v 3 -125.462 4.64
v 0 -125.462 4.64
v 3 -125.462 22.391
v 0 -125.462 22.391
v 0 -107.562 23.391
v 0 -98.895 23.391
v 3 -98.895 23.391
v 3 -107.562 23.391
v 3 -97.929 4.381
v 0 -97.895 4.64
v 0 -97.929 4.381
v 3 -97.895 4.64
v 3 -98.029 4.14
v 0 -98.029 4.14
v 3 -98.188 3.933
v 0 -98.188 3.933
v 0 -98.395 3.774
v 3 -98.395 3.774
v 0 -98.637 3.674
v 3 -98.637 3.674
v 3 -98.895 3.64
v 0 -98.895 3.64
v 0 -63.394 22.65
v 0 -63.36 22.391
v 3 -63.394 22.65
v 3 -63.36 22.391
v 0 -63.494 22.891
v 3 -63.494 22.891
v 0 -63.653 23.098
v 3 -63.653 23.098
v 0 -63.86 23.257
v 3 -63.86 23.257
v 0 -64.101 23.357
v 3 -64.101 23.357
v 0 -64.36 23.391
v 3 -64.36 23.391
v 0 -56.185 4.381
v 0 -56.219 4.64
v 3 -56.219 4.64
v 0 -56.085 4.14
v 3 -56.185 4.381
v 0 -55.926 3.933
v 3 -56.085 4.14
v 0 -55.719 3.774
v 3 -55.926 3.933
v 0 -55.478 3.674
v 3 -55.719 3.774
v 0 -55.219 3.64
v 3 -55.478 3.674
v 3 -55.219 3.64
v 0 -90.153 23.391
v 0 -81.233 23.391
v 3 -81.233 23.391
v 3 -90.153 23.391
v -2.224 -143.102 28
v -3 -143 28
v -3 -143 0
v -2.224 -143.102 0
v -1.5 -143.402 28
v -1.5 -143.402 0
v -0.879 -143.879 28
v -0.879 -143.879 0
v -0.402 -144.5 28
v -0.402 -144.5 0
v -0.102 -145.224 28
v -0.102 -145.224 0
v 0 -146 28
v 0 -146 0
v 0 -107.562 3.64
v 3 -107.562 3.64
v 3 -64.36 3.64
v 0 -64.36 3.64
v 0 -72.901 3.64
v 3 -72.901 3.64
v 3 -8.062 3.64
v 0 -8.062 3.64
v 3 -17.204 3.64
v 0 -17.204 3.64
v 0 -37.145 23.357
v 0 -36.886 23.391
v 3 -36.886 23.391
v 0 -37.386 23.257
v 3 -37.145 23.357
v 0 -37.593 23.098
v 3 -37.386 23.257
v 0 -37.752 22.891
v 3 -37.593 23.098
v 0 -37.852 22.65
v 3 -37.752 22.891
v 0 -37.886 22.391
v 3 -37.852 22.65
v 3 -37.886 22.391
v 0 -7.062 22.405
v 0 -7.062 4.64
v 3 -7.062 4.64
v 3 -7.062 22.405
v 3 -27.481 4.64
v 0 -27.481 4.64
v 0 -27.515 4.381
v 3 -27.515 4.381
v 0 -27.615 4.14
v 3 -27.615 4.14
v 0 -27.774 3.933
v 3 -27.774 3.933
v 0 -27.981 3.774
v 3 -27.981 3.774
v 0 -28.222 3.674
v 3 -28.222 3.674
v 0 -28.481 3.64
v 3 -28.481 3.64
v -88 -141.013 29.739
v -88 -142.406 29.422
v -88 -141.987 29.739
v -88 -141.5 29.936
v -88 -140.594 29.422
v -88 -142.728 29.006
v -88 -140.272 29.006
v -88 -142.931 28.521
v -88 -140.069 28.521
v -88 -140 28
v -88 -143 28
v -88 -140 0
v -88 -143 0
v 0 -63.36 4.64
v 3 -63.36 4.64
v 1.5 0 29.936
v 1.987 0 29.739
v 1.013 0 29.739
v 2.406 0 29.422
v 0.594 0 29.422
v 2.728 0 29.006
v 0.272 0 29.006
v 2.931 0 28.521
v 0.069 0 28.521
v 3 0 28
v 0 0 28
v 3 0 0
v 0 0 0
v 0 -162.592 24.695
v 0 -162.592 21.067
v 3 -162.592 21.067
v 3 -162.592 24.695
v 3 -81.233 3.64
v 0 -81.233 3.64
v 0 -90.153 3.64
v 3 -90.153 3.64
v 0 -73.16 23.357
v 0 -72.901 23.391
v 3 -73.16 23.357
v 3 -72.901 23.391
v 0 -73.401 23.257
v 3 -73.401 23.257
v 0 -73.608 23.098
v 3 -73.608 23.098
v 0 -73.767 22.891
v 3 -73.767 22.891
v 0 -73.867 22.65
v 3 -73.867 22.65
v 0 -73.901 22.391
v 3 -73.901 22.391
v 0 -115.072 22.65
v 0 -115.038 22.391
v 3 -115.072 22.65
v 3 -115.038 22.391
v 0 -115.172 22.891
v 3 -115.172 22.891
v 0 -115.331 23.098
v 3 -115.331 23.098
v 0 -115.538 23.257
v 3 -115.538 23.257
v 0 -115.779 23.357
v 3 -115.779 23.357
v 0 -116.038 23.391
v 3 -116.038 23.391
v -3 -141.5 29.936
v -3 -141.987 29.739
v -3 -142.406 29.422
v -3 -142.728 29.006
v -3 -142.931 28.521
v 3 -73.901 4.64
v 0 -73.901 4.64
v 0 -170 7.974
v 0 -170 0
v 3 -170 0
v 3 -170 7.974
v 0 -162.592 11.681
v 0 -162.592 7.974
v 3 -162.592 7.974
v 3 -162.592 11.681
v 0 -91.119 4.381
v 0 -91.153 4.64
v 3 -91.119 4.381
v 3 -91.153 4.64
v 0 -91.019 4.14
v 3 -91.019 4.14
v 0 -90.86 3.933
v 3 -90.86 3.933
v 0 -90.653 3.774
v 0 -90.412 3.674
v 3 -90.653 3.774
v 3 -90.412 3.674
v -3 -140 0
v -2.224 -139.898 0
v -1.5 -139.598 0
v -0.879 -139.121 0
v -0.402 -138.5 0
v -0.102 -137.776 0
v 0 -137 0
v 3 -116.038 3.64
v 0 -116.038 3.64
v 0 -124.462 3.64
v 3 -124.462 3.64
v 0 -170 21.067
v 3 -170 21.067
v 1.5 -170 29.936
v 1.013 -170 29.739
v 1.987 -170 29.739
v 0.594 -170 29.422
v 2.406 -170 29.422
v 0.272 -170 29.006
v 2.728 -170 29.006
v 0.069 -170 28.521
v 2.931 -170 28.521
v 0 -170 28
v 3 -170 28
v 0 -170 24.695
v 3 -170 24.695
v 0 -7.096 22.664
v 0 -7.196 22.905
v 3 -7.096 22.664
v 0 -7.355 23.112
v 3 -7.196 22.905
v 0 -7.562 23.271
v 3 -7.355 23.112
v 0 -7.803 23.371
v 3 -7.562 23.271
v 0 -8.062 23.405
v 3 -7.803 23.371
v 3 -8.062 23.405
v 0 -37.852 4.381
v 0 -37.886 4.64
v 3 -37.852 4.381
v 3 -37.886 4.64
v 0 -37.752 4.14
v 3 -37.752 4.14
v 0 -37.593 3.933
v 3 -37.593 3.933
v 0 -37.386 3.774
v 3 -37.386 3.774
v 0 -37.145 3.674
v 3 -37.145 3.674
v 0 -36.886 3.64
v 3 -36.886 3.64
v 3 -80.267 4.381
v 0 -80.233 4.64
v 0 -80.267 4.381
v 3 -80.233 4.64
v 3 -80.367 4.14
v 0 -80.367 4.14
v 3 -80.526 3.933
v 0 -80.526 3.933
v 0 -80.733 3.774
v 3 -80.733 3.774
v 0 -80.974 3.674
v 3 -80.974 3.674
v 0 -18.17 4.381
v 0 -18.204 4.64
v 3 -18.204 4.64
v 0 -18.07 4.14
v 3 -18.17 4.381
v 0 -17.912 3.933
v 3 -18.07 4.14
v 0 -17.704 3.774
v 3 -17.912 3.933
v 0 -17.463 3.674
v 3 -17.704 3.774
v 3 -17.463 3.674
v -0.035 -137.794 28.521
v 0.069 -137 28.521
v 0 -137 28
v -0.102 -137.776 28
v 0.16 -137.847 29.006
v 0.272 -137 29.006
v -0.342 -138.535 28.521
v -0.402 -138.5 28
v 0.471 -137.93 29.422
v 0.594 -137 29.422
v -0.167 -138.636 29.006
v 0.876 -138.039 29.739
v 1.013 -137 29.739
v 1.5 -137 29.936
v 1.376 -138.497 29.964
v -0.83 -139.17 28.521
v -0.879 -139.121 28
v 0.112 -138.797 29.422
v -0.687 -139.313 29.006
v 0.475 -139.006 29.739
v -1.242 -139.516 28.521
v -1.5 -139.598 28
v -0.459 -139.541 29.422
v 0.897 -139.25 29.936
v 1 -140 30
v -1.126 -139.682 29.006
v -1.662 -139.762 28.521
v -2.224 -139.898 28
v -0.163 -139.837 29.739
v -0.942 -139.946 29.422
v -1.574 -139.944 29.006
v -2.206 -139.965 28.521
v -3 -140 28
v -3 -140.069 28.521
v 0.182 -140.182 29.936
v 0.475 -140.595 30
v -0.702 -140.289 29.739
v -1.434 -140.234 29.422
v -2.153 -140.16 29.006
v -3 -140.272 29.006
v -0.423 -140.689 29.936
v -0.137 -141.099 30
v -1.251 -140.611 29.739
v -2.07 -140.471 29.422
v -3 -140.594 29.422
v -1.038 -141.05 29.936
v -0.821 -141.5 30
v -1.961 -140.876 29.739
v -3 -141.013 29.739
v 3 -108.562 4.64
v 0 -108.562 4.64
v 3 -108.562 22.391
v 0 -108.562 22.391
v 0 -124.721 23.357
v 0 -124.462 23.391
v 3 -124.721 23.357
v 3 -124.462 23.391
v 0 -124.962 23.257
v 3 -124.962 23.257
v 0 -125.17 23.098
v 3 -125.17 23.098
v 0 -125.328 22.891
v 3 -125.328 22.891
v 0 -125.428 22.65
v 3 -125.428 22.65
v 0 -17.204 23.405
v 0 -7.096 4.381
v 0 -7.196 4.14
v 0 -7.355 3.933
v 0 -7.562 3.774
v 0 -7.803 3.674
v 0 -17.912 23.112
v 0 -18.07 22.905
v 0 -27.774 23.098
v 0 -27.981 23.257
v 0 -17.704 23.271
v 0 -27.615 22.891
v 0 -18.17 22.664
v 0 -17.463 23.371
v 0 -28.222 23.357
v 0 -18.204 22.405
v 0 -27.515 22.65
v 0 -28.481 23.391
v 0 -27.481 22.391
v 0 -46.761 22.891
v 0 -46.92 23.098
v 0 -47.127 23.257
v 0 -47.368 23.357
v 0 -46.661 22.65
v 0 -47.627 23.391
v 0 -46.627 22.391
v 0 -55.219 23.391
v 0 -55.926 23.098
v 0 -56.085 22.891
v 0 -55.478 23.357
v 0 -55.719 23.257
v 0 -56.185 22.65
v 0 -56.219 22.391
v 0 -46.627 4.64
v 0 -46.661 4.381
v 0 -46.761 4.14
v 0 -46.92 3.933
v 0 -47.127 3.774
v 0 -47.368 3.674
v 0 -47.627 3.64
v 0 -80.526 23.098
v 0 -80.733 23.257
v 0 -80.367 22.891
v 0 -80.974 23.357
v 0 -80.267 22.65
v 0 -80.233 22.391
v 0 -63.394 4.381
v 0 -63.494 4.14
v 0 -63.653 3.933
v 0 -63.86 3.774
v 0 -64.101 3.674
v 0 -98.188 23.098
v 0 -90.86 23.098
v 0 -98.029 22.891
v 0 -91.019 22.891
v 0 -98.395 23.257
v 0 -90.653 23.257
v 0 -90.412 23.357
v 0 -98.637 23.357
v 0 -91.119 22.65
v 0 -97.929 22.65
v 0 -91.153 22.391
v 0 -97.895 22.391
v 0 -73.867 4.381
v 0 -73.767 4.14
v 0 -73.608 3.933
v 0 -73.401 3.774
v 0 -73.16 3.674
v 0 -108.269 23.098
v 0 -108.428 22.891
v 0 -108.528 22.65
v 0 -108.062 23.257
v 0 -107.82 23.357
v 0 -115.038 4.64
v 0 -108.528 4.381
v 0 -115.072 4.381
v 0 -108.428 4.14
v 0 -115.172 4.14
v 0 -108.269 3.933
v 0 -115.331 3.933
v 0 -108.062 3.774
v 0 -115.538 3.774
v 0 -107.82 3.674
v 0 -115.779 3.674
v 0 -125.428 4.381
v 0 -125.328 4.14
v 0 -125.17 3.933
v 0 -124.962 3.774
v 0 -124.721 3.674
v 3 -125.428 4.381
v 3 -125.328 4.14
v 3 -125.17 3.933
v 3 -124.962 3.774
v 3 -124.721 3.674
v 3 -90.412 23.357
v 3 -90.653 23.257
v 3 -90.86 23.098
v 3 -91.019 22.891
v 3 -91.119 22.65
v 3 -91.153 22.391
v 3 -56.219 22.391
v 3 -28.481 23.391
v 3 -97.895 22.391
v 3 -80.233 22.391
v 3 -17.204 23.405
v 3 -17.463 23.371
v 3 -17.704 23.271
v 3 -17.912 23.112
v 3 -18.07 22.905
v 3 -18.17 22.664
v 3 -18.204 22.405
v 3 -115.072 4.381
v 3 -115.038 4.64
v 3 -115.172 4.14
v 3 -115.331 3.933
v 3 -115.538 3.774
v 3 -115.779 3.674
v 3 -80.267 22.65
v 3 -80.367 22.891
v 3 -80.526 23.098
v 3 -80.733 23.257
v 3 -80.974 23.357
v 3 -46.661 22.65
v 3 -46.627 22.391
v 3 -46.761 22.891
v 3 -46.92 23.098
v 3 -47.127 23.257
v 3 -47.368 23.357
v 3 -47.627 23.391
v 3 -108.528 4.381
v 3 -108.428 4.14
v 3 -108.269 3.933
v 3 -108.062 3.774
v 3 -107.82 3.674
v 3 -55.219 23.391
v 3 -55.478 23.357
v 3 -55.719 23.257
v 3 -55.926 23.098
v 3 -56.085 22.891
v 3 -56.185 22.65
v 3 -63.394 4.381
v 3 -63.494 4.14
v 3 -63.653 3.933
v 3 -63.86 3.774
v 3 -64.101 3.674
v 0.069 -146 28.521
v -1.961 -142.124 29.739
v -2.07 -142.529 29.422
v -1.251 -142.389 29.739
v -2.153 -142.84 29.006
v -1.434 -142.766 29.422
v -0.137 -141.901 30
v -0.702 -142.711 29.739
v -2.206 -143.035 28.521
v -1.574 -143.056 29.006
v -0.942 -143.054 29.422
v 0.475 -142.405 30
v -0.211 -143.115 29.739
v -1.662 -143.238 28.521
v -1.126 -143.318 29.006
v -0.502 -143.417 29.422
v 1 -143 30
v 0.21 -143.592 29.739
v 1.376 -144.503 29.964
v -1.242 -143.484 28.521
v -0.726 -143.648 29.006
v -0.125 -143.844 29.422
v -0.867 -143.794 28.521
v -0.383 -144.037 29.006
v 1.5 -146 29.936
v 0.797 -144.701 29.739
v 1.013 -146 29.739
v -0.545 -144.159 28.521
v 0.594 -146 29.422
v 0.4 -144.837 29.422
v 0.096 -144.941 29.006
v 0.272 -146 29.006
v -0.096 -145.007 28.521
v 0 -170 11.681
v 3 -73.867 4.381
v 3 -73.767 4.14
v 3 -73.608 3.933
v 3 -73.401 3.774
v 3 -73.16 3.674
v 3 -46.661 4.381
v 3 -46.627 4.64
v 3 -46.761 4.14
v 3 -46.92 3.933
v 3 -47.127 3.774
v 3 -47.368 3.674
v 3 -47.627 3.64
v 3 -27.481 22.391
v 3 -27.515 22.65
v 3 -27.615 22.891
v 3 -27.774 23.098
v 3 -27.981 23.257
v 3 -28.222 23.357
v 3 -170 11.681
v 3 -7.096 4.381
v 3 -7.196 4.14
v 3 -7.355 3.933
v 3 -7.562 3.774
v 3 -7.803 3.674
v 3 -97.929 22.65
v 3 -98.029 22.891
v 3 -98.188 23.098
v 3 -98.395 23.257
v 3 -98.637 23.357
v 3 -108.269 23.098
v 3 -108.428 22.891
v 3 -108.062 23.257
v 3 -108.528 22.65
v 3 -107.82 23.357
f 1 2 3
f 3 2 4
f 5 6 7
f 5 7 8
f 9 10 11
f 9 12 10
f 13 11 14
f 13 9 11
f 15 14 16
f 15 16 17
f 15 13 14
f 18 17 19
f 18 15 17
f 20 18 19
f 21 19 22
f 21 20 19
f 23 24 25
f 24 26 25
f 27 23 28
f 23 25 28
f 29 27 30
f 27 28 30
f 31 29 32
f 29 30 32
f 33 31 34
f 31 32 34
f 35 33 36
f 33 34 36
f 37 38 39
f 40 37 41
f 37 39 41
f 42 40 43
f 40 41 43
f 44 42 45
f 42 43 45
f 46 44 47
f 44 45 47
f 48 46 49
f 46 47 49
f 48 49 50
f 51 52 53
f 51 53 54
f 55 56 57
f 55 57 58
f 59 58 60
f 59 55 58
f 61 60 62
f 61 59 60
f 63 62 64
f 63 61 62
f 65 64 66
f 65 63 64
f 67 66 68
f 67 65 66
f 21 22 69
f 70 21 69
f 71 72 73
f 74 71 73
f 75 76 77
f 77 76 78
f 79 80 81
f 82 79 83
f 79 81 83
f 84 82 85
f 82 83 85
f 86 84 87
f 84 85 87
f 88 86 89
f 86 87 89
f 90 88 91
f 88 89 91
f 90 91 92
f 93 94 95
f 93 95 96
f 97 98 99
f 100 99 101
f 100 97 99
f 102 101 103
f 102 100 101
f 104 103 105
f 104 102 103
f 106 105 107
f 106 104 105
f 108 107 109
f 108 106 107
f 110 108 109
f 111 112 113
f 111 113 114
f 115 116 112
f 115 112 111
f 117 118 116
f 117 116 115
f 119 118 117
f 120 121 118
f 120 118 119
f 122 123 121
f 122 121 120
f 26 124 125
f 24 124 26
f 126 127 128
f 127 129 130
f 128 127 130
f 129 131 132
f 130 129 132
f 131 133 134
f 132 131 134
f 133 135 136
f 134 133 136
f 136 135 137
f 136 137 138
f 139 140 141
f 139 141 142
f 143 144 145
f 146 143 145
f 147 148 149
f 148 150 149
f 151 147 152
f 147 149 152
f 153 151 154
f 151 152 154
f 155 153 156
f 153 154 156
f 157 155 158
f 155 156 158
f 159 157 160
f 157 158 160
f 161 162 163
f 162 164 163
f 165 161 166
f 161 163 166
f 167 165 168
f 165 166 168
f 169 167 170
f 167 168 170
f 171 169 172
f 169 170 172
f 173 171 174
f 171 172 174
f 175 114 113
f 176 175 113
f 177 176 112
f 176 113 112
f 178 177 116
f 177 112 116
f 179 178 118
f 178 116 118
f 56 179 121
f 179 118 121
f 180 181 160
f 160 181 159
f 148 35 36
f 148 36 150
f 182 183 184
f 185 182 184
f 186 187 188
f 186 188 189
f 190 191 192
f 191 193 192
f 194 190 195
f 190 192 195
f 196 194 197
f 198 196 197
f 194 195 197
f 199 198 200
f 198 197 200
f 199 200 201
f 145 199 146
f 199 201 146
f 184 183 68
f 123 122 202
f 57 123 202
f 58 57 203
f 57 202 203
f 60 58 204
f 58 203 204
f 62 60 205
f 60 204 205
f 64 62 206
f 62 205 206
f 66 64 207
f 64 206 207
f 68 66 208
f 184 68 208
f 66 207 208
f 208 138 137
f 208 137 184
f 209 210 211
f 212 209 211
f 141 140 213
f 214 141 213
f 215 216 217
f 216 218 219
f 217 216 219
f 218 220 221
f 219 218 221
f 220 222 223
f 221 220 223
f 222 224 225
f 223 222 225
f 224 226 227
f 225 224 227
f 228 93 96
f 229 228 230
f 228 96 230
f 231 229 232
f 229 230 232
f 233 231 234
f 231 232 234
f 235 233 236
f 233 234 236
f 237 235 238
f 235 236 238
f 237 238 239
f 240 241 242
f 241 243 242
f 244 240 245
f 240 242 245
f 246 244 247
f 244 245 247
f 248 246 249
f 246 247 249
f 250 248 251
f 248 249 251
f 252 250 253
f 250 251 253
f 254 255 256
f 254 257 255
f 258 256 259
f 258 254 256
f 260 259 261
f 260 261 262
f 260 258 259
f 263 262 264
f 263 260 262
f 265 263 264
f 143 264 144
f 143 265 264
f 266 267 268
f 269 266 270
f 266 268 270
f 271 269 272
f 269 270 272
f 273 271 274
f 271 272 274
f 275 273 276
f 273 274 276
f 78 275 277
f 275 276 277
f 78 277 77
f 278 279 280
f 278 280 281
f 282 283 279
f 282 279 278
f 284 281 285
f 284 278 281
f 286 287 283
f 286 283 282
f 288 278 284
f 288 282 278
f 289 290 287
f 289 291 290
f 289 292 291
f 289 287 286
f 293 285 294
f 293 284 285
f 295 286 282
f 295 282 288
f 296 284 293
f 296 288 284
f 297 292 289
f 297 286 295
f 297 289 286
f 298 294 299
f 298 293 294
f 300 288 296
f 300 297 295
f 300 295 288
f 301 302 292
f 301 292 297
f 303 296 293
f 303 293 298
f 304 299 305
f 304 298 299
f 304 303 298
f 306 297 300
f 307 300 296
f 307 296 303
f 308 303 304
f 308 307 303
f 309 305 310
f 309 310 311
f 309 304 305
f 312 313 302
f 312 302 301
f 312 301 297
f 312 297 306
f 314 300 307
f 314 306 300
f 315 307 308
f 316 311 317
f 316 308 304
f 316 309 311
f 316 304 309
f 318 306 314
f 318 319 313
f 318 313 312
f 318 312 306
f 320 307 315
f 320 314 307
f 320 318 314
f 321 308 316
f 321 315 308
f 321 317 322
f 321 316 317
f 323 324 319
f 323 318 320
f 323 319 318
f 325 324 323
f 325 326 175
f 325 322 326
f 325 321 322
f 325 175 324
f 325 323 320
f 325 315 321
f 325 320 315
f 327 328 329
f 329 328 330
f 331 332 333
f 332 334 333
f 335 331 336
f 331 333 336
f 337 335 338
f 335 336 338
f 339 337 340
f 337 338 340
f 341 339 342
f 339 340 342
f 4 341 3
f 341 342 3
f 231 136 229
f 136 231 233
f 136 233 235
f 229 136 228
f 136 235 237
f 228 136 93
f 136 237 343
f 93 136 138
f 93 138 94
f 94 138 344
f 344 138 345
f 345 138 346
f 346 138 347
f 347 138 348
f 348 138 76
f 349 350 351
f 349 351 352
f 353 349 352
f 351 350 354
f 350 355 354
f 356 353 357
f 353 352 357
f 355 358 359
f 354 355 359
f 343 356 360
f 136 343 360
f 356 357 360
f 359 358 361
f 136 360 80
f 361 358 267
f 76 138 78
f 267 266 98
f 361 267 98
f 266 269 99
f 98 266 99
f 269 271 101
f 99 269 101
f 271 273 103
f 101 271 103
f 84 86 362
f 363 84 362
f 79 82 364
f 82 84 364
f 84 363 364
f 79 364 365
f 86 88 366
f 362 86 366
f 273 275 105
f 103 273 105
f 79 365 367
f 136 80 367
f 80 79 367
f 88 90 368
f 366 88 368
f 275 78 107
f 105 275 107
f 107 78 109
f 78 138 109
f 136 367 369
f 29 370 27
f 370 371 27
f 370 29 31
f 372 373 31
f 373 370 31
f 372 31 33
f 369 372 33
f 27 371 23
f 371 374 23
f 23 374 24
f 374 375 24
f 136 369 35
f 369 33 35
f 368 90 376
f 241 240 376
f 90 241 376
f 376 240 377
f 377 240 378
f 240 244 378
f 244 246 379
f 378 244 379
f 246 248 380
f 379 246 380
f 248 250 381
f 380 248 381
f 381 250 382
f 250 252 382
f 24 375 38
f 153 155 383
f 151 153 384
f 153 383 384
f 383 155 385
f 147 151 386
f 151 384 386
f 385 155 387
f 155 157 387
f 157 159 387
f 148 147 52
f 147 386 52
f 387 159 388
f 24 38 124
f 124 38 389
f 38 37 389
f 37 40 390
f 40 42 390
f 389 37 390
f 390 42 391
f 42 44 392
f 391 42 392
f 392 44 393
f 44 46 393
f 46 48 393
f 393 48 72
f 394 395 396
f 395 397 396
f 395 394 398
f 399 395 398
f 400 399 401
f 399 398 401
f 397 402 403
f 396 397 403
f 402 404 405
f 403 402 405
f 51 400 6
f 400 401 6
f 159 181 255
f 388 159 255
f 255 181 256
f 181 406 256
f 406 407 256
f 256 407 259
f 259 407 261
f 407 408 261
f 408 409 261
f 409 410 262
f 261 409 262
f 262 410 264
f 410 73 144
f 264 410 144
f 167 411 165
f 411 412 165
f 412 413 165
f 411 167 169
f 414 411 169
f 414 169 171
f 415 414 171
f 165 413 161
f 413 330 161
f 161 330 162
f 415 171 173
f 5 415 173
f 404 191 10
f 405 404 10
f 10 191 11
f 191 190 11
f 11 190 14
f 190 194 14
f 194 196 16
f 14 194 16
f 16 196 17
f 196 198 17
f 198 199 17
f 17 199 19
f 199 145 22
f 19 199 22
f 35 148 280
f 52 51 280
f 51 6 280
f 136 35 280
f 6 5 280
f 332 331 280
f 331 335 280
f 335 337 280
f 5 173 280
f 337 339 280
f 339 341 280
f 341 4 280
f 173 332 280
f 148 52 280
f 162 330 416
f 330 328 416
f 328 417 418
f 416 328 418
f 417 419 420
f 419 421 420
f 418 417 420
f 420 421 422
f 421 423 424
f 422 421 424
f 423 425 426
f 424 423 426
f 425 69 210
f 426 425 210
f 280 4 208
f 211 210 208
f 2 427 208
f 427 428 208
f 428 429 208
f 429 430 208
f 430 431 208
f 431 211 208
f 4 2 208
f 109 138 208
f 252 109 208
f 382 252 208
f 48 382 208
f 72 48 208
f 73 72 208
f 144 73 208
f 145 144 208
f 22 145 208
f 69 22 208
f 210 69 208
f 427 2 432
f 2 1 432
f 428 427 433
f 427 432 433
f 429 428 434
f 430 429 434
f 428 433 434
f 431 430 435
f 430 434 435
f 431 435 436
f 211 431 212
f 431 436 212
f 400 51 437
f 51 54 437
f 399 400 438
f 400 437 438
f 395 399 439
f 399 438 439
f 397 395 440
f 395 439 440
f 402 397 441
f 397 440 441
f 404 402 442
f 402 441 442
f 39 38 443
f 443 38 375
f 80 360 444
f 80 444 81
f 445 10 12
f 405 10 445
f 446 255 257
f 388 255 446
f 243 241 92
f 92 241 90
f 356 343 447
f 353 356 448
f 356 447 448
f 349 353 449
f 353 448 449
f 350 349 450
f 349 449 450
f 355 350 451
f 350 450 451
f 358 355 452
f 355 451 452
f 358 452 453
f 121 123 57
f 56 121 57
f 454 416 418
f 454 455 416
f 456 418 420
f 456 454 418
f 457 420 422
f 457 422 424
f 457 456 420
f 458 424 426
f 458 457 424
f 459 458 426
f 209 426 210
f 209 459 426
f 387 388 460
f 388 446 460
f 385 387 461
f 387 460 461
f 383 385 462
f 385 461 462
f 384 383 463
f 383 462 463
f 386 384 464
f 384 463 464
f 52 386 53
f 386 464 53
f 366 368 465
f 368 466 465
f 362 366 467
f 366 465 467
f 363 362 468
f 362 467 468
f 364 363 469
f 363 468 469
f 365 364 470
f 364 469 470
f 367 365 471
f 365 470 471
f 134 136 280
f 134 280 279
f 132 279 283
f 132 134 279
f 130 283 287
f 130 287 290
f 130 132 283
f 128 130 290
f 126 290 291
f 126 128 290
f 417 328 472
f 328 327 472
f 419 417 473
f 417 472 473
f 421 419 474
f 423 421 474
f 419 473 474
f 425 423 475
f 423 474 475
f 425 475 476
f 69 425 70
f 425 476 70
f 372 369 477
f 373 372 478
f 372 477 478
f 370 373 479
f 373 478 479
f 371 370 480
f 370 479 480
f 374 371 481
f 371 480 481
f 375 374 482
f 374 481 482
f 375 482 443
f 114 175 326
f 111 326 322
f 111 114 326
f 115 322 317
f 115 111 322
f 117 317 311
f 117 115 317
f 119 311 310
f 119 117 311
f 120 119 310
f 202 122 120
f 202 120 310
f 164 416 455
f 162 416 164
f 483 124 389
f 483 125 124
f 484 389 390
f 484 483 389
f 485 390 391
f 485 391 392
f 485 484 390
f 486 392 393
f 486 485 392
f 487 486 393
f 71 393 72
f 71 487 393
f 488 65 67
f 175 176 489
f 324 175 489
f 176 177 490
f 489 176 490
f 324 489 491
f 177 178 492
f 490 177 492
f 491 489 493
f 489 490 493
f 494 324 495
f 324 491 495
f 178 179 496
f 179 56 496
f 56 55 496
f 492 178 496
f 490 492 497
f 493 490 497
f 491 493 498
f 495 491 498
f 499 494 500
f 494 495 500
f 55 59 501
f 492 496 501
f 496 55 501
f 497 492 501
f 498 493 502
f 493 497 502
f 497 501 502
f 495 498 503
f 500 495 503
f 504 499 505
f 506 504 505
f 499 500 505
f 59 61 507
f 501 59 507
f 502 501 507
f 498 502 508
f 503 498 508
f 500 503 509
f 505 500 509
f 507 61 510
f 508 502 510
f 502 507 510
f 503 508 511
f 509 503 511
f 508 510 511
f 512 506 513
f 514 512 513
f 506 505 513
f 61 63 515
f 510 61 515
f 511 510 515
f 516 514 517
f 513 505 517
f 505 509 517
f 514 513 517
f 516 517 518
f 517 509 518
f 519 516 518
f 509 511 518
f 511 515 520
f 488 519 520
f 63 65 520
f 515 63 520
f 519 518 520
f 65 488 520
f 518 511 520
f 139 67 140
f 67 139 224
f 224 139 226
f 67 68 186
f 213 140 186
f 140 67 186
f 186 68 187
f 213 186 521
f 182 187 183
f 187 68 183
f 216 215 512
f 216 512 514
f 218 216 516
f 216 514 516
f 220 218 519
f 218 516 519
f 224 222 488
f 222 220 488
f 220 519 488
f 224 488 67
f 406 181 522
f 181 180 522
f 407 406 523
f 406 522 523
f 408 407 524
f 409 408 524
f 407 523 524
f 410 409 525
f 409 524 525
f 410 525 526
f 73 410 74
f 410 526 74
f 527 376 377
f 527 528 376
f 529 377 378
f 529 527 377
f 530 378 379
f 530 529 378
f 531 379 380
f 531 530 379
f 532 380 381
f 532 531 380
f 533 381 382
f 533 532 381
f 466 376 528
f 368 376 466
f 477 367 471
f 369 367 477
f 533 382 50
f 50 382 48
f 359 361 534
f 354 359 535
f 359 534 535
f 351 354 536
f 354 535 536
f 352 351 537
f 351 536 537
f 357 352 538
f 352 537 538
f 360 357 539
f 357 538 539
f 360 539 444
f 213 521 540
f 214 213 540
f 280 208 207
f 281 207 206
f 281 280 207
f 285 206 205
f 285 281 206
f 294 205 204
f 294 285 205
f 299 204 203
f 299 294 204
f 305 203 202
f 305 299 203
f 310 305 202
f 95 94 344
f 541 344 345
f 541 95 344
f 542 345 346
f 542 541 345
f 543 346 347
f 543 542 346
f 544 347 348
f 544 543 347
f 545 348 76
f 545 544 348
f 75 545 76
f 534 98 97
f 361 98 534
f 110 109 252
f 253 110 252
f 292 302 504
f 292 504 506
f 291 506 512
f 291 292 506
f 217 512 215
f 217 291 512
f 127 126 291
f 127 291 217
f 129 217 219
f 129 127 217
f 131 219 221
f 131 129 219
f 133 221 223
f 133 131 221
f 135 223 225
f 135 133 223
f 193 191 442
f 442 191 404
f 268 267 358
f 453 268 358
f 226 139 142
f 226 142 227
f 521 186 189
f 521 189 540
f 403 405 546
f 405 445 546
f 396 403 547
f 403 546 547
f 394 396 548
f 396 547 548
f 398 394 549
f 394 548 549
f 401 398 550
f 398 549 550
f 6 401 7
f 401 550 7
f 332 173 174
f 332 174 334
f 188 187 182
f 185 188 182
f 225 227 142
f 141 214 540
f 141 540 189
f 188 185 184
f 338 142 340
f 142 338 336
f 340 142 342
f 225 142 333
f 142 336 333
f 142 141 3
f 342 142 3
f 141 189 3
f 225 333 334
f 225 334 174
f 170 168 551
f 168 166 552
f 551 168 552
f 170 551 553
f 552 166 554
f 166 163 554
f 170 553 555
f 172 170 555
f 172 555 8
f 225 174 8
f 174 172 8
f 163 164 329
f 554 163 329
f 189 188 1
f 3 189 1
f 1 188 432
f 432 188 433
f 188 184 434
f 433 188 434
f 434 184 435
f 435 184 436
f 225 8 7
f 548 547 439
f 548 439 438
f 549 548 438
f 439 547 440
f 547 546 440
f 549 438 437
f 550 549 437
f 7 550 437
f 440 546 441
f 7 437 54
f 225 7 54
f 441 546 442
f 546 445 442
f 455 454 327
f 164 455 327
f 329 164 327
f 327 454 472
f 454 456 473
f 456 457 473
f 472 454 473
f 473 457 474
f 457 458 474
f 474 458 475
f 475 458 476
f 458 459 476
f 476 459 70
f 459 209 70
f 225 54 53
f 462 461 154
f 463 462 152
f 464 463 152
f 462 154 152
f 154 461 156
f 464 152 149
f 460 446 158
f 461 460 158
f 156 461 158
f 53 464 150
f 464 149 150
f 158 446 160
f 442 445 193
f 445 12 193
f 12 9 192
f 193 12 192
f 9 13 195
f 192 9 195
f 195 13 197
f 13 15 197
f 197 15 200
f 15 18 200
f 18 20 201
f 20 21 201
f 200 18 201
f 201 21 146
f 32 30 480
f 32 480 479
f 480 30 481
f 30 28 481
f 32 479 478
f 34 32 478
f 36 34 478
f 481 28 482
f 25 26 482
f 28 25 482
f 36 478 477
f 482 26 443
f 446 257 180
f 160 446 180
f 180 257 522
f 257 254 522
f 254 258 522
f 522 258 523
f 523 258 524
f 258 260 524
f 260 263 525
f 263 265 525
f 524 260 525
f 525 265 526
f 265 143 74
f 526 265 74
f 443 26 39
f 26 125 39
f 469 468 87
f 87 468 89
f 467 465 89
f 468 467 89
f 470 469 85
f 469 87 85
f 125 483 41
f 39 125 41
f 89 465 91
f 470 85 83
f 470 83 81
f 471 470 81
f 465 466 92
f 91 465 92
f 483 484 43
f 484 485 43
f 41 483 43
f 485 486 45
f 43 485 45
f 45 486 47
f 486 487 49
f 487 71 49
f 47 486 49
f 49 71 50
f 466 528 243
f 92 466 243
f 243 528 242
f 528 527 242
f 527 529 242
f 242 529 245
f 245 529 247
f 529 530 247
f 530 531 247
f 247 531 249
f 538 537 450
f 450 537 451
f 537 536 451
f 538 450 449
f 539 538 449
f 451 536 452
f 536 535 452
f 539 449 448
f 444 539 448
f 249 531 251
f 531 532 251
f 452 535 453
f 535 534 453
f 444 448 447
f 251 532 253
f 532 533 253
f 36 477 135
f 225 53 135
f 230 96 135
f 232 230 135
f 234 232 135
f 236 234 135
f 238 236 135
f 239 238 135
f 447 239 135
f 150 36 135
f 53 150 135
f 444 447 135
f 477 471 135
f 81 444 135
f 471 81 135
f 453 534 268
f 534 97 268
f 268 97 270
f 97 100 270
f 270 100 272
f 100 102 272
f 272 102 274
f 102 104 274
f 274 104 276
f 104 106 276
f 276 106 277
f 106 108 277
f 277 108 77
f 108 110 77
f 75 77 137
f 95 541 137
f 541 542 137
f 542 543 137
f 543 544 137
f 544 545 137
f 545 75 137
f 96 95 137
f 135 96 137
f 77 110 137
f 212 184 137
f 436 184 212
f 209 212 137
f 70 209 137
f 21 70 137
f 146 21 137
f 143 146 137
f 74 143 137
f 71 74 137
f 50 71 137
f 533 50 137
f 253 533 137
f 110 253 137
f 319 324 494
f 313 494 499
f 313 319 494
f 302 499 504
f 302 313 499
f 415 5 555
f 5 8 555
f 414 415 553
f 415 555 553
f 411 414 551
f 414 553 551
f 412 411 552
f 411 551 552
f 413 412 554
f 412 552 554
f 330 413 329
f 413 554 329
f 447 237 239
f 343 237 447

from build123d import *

# Parameters (mm, degrees)
F0_W         = 88
F0_H         = 3
F1_DEPTH     = 30
F2_R         = 3
F3_T1_DEPTH  = 142
F3_T3_DEPTH  = 90
F3_T5_DEPTH  = 180
F3_T7_DEPTH  = 29
F3_T10_ANGLE = 90
F3_T12_ANGLE = 90
F4_W         = 7.4076932669
F4_H         = 3.6282110959
F4_H_2       = 3.7070848048
F5_DEPTH     = 3
F6_W         = 11.1425933428
F6_H         = 19.764843164
F6_W_2       = 10.4046501219
F6_H_2       = 19.7511005681
F6_W_3       = 9.5925889909
F6_W_4       = 10.5412900448
F6_W_5       = 10.9199807048
F6_W_6       = 10.6662213802
F6_W_7       = 10.4241892695
F7_DEPTH     = 3
F8_R         = 1


# Not quite as in the source:
# - a fillet or chamfer that OpenCascade refuses, or shapes differently, is made with other operations: its cross-section is extruded or revolved along the edge and cut away or added


with BuildPart() as f1:
    # F0 (on Top) → F1 (new body)
    with BuildSketch(Plane.XY):
        Polygon((3, 0), (0, 0), (0, -140), (0, -143), (0, -170), (3, -170), (3, -140), align=None)
        with Locations((-44, -141.5)):
            Rectangle(F0_W, F0_H)
    extrude(amount=F1_DEPTH)

    # F2
    f2_edges = [f1.edges().sort_by_distance(p)[0] for p in [
        (0, -140, 15),
        (0, -143, 15),
    ]]
    fillet(f2_edges, radius=F2_R)

    # F3: fillet of radius 2 on 3 edges, made by hand

    # F3_s2 → F3_t1 (cut)
    with BuildSketch(Plane.XZ.offset(-5)):
        with BuildLine():
            ThreePointArc((0, 28), (0.5857864376, 29.4142135624), (2, 30))
            Line((2, 30), (0, 30))
            Line((0, 30), (0, 28))
        make_face()
    extrude(amount=F3_T1_DEPTH, mode=Mode.SUBTRACT)

    # F3_s4 → F3_t3 (cut)
    with BuildSketch(Plane.YZ.offset(-93)):
        with BuildLine():
            ThreePointArc((-141, 30), (-142.4142135624, 29.4142135624), (-143, 28))
            Line((-143, 28), (-143, 30))
            Line((-143, 30), (-141, 30))
        make_face()
        with BuildLine():
            ThreePointArc((-142, 30), (-140.5857864376, 29.4142135624), (-140, 28))
            Line((-140, 28), (-140, 30))
            Line((-140, 30), (-142, 30))
        make_face()
    extrude(amount=F3_T3_DEPTH, mode=Mode.SUBTRACT)

    # F3_s6 → F3_t5 (cut)
    with BuildSketch(Plane.XZ.offset(-5)):
        with BuildLine():
            ThreePointArc((1, 30), (2.4142135624, 29.4142135624), (3, 28))
            Line((3, 28), (3, 30))
            Line((3, 30), (1, 30))
        make_face()
    extrude(amount=F3_T5_DEPTH, mode=Mode.SUBTRACT)

    # F3_s8 → F3_t7 (cut)
    with BuildSketch(Plane.XZ.offset(146)):
        with BuildLine():
            ThreePointArc((2, 30), (0.5857864376, 29.4142135624), (0, 28))
            Line((0, 28), (0, 30))
            Line((0, 30), (2, 30))
        make_face()
    extrude(amount=F3_T7_DEPTH, mode=Mode.SUBTRACT)

    # F3_s9 → F3_t10 (revolve, cut)
    with BuildSketch(Plane.YZ.offset(-3)):
        with BuildLine():
            ThreePointArc((-141, 30), (-142.4142135624, 29.4142135624), (-143, 28))
            Line((-143, 28), (-143, 30))
            Line((-143, 30), (-141, 30))
        make_face()
    revolve(axis=Axis((-3, -146, 30), (0, 0, -1)), revolution_arc=F3_T10_ANGLE, mode=Mode.SUBTRACT)

    # F3_s11 → F3_t12 (revolve, cut)
    with BuildSketch(Plane.XZ.offset(137)):
        with BuildLine():
            ThreePointArc((0, 28), (0.5857864376, 29.4142135624), (2, 30))
            Line((2, 30), (0, 30))
            Line((0, 30), (0, 28))
        make_face()
    revolve(axis=Axis((-3, -137, 30), (0, 0, -1)), revolution_arc=F3_T12_ANGLE, mode=Mode.SUBTRACT)

    # F4 (on face) → F5 (cut)
    with BuildSketch(Plane(origin=(0, 0, 0), x_dir=(0, -1, 0), z_dir=(-1, 0, 0))):
        with Locations((166.2961533666, 22.8808587417)):
            Rectangle(F4_W, F4_H)
        with Locations((166.2961533666, 9.8271891475)):
            Rectangle(F4_W, F4_H_2)
    extrude(amount=-F5_DEPTH, mode=Mode.SUBTRACT)

    # F6 (on face) → F7 (cut)
    with BuildSketch(Plane(origin=(0, 0, 0), x_dir=(0, -1, 0), z_dir=(-1, 0, 0))):
        with Locations((12.6331185456, 13.5222995887)):
            Rectangle(F6_W, F6_H)
        with Locations((32.683422789, 13.5154282907)):
            Rectangle(F6_W_2, F6_H_2)
        with Locations((51.4230821282, 13.5154282907)):
            Rectangle(F6_W_3, F6_H_2)
        with Locations((68.6303824186, 13.5154282907)):
            Rectangle(F6_W_4, F6_H_2)
        with Locations((85.6932289898, 13.5154282907)):
            Rectangle(F6_W_5, F6_H_2)
        with Locations((103.2284647226, 13.5154282907)):
            Rectangle(F6_W_6, F6_H_2)
        with Locations((120.2503331006, 13.5154282907)):
            Rectangle(F6_W_7, F6_H_2)
    extrude(amount=-F7_DEPTH, mode=Mode.SUBTRACT)

    # F8
    f8_edges = [f1.edges().sort_by_distance(p)[0] for p in [
        (1.5, -7.061822, 23.404721),
        (1.5, -27.481098, 23.390979),
        (1.5, -46.626788, 23.390979),
        (1.5, -63.359737, 23.390979),
        (1.5, -80.233239, 23.390979),
        (1.5, -97.895354, 23.390979),
        (1.5, -115.038238, 23.390979),
        (1.5, -7.061822, 3.639878),
        (1.5, -27.481098, 3.639878),
        (1.5, -46.626788, 3.639878),
        (1.5, -63.359737, 3.639878),
        (1.5, -80.233239, 3.639878),
        (1.5, -97.895354, 3.639878),
        (1.5, -115.038238, 3.639878),
        (1.5, -125.462428, 23.390979),
        (1.5, -108.561575, 23.390979),
        (1.5, -91.153219, 23.390979),
        (1.5, -73.901027, 23.390979),
        (1.5, -56.219377, 23.390979),
        (1.5, -37.885748, 23.390979),
        (1.5, -18.204415, 23.404721),
        (1.5, -18.204415, 3.639878),
        (1.5, -37.885748, 3.639878),
        (1.5, -56.219377, 3.639878),
        (1.5, -73.901027, 3.639878),
        (1.5, -91.153219, 3.639878),
        (1.5, -108.561575, 3.639878),
        (1.5, -125.462428, 3.639878),
    ]]
    fillet(f8_edges, radius=F8_R)


solid = f1.part
